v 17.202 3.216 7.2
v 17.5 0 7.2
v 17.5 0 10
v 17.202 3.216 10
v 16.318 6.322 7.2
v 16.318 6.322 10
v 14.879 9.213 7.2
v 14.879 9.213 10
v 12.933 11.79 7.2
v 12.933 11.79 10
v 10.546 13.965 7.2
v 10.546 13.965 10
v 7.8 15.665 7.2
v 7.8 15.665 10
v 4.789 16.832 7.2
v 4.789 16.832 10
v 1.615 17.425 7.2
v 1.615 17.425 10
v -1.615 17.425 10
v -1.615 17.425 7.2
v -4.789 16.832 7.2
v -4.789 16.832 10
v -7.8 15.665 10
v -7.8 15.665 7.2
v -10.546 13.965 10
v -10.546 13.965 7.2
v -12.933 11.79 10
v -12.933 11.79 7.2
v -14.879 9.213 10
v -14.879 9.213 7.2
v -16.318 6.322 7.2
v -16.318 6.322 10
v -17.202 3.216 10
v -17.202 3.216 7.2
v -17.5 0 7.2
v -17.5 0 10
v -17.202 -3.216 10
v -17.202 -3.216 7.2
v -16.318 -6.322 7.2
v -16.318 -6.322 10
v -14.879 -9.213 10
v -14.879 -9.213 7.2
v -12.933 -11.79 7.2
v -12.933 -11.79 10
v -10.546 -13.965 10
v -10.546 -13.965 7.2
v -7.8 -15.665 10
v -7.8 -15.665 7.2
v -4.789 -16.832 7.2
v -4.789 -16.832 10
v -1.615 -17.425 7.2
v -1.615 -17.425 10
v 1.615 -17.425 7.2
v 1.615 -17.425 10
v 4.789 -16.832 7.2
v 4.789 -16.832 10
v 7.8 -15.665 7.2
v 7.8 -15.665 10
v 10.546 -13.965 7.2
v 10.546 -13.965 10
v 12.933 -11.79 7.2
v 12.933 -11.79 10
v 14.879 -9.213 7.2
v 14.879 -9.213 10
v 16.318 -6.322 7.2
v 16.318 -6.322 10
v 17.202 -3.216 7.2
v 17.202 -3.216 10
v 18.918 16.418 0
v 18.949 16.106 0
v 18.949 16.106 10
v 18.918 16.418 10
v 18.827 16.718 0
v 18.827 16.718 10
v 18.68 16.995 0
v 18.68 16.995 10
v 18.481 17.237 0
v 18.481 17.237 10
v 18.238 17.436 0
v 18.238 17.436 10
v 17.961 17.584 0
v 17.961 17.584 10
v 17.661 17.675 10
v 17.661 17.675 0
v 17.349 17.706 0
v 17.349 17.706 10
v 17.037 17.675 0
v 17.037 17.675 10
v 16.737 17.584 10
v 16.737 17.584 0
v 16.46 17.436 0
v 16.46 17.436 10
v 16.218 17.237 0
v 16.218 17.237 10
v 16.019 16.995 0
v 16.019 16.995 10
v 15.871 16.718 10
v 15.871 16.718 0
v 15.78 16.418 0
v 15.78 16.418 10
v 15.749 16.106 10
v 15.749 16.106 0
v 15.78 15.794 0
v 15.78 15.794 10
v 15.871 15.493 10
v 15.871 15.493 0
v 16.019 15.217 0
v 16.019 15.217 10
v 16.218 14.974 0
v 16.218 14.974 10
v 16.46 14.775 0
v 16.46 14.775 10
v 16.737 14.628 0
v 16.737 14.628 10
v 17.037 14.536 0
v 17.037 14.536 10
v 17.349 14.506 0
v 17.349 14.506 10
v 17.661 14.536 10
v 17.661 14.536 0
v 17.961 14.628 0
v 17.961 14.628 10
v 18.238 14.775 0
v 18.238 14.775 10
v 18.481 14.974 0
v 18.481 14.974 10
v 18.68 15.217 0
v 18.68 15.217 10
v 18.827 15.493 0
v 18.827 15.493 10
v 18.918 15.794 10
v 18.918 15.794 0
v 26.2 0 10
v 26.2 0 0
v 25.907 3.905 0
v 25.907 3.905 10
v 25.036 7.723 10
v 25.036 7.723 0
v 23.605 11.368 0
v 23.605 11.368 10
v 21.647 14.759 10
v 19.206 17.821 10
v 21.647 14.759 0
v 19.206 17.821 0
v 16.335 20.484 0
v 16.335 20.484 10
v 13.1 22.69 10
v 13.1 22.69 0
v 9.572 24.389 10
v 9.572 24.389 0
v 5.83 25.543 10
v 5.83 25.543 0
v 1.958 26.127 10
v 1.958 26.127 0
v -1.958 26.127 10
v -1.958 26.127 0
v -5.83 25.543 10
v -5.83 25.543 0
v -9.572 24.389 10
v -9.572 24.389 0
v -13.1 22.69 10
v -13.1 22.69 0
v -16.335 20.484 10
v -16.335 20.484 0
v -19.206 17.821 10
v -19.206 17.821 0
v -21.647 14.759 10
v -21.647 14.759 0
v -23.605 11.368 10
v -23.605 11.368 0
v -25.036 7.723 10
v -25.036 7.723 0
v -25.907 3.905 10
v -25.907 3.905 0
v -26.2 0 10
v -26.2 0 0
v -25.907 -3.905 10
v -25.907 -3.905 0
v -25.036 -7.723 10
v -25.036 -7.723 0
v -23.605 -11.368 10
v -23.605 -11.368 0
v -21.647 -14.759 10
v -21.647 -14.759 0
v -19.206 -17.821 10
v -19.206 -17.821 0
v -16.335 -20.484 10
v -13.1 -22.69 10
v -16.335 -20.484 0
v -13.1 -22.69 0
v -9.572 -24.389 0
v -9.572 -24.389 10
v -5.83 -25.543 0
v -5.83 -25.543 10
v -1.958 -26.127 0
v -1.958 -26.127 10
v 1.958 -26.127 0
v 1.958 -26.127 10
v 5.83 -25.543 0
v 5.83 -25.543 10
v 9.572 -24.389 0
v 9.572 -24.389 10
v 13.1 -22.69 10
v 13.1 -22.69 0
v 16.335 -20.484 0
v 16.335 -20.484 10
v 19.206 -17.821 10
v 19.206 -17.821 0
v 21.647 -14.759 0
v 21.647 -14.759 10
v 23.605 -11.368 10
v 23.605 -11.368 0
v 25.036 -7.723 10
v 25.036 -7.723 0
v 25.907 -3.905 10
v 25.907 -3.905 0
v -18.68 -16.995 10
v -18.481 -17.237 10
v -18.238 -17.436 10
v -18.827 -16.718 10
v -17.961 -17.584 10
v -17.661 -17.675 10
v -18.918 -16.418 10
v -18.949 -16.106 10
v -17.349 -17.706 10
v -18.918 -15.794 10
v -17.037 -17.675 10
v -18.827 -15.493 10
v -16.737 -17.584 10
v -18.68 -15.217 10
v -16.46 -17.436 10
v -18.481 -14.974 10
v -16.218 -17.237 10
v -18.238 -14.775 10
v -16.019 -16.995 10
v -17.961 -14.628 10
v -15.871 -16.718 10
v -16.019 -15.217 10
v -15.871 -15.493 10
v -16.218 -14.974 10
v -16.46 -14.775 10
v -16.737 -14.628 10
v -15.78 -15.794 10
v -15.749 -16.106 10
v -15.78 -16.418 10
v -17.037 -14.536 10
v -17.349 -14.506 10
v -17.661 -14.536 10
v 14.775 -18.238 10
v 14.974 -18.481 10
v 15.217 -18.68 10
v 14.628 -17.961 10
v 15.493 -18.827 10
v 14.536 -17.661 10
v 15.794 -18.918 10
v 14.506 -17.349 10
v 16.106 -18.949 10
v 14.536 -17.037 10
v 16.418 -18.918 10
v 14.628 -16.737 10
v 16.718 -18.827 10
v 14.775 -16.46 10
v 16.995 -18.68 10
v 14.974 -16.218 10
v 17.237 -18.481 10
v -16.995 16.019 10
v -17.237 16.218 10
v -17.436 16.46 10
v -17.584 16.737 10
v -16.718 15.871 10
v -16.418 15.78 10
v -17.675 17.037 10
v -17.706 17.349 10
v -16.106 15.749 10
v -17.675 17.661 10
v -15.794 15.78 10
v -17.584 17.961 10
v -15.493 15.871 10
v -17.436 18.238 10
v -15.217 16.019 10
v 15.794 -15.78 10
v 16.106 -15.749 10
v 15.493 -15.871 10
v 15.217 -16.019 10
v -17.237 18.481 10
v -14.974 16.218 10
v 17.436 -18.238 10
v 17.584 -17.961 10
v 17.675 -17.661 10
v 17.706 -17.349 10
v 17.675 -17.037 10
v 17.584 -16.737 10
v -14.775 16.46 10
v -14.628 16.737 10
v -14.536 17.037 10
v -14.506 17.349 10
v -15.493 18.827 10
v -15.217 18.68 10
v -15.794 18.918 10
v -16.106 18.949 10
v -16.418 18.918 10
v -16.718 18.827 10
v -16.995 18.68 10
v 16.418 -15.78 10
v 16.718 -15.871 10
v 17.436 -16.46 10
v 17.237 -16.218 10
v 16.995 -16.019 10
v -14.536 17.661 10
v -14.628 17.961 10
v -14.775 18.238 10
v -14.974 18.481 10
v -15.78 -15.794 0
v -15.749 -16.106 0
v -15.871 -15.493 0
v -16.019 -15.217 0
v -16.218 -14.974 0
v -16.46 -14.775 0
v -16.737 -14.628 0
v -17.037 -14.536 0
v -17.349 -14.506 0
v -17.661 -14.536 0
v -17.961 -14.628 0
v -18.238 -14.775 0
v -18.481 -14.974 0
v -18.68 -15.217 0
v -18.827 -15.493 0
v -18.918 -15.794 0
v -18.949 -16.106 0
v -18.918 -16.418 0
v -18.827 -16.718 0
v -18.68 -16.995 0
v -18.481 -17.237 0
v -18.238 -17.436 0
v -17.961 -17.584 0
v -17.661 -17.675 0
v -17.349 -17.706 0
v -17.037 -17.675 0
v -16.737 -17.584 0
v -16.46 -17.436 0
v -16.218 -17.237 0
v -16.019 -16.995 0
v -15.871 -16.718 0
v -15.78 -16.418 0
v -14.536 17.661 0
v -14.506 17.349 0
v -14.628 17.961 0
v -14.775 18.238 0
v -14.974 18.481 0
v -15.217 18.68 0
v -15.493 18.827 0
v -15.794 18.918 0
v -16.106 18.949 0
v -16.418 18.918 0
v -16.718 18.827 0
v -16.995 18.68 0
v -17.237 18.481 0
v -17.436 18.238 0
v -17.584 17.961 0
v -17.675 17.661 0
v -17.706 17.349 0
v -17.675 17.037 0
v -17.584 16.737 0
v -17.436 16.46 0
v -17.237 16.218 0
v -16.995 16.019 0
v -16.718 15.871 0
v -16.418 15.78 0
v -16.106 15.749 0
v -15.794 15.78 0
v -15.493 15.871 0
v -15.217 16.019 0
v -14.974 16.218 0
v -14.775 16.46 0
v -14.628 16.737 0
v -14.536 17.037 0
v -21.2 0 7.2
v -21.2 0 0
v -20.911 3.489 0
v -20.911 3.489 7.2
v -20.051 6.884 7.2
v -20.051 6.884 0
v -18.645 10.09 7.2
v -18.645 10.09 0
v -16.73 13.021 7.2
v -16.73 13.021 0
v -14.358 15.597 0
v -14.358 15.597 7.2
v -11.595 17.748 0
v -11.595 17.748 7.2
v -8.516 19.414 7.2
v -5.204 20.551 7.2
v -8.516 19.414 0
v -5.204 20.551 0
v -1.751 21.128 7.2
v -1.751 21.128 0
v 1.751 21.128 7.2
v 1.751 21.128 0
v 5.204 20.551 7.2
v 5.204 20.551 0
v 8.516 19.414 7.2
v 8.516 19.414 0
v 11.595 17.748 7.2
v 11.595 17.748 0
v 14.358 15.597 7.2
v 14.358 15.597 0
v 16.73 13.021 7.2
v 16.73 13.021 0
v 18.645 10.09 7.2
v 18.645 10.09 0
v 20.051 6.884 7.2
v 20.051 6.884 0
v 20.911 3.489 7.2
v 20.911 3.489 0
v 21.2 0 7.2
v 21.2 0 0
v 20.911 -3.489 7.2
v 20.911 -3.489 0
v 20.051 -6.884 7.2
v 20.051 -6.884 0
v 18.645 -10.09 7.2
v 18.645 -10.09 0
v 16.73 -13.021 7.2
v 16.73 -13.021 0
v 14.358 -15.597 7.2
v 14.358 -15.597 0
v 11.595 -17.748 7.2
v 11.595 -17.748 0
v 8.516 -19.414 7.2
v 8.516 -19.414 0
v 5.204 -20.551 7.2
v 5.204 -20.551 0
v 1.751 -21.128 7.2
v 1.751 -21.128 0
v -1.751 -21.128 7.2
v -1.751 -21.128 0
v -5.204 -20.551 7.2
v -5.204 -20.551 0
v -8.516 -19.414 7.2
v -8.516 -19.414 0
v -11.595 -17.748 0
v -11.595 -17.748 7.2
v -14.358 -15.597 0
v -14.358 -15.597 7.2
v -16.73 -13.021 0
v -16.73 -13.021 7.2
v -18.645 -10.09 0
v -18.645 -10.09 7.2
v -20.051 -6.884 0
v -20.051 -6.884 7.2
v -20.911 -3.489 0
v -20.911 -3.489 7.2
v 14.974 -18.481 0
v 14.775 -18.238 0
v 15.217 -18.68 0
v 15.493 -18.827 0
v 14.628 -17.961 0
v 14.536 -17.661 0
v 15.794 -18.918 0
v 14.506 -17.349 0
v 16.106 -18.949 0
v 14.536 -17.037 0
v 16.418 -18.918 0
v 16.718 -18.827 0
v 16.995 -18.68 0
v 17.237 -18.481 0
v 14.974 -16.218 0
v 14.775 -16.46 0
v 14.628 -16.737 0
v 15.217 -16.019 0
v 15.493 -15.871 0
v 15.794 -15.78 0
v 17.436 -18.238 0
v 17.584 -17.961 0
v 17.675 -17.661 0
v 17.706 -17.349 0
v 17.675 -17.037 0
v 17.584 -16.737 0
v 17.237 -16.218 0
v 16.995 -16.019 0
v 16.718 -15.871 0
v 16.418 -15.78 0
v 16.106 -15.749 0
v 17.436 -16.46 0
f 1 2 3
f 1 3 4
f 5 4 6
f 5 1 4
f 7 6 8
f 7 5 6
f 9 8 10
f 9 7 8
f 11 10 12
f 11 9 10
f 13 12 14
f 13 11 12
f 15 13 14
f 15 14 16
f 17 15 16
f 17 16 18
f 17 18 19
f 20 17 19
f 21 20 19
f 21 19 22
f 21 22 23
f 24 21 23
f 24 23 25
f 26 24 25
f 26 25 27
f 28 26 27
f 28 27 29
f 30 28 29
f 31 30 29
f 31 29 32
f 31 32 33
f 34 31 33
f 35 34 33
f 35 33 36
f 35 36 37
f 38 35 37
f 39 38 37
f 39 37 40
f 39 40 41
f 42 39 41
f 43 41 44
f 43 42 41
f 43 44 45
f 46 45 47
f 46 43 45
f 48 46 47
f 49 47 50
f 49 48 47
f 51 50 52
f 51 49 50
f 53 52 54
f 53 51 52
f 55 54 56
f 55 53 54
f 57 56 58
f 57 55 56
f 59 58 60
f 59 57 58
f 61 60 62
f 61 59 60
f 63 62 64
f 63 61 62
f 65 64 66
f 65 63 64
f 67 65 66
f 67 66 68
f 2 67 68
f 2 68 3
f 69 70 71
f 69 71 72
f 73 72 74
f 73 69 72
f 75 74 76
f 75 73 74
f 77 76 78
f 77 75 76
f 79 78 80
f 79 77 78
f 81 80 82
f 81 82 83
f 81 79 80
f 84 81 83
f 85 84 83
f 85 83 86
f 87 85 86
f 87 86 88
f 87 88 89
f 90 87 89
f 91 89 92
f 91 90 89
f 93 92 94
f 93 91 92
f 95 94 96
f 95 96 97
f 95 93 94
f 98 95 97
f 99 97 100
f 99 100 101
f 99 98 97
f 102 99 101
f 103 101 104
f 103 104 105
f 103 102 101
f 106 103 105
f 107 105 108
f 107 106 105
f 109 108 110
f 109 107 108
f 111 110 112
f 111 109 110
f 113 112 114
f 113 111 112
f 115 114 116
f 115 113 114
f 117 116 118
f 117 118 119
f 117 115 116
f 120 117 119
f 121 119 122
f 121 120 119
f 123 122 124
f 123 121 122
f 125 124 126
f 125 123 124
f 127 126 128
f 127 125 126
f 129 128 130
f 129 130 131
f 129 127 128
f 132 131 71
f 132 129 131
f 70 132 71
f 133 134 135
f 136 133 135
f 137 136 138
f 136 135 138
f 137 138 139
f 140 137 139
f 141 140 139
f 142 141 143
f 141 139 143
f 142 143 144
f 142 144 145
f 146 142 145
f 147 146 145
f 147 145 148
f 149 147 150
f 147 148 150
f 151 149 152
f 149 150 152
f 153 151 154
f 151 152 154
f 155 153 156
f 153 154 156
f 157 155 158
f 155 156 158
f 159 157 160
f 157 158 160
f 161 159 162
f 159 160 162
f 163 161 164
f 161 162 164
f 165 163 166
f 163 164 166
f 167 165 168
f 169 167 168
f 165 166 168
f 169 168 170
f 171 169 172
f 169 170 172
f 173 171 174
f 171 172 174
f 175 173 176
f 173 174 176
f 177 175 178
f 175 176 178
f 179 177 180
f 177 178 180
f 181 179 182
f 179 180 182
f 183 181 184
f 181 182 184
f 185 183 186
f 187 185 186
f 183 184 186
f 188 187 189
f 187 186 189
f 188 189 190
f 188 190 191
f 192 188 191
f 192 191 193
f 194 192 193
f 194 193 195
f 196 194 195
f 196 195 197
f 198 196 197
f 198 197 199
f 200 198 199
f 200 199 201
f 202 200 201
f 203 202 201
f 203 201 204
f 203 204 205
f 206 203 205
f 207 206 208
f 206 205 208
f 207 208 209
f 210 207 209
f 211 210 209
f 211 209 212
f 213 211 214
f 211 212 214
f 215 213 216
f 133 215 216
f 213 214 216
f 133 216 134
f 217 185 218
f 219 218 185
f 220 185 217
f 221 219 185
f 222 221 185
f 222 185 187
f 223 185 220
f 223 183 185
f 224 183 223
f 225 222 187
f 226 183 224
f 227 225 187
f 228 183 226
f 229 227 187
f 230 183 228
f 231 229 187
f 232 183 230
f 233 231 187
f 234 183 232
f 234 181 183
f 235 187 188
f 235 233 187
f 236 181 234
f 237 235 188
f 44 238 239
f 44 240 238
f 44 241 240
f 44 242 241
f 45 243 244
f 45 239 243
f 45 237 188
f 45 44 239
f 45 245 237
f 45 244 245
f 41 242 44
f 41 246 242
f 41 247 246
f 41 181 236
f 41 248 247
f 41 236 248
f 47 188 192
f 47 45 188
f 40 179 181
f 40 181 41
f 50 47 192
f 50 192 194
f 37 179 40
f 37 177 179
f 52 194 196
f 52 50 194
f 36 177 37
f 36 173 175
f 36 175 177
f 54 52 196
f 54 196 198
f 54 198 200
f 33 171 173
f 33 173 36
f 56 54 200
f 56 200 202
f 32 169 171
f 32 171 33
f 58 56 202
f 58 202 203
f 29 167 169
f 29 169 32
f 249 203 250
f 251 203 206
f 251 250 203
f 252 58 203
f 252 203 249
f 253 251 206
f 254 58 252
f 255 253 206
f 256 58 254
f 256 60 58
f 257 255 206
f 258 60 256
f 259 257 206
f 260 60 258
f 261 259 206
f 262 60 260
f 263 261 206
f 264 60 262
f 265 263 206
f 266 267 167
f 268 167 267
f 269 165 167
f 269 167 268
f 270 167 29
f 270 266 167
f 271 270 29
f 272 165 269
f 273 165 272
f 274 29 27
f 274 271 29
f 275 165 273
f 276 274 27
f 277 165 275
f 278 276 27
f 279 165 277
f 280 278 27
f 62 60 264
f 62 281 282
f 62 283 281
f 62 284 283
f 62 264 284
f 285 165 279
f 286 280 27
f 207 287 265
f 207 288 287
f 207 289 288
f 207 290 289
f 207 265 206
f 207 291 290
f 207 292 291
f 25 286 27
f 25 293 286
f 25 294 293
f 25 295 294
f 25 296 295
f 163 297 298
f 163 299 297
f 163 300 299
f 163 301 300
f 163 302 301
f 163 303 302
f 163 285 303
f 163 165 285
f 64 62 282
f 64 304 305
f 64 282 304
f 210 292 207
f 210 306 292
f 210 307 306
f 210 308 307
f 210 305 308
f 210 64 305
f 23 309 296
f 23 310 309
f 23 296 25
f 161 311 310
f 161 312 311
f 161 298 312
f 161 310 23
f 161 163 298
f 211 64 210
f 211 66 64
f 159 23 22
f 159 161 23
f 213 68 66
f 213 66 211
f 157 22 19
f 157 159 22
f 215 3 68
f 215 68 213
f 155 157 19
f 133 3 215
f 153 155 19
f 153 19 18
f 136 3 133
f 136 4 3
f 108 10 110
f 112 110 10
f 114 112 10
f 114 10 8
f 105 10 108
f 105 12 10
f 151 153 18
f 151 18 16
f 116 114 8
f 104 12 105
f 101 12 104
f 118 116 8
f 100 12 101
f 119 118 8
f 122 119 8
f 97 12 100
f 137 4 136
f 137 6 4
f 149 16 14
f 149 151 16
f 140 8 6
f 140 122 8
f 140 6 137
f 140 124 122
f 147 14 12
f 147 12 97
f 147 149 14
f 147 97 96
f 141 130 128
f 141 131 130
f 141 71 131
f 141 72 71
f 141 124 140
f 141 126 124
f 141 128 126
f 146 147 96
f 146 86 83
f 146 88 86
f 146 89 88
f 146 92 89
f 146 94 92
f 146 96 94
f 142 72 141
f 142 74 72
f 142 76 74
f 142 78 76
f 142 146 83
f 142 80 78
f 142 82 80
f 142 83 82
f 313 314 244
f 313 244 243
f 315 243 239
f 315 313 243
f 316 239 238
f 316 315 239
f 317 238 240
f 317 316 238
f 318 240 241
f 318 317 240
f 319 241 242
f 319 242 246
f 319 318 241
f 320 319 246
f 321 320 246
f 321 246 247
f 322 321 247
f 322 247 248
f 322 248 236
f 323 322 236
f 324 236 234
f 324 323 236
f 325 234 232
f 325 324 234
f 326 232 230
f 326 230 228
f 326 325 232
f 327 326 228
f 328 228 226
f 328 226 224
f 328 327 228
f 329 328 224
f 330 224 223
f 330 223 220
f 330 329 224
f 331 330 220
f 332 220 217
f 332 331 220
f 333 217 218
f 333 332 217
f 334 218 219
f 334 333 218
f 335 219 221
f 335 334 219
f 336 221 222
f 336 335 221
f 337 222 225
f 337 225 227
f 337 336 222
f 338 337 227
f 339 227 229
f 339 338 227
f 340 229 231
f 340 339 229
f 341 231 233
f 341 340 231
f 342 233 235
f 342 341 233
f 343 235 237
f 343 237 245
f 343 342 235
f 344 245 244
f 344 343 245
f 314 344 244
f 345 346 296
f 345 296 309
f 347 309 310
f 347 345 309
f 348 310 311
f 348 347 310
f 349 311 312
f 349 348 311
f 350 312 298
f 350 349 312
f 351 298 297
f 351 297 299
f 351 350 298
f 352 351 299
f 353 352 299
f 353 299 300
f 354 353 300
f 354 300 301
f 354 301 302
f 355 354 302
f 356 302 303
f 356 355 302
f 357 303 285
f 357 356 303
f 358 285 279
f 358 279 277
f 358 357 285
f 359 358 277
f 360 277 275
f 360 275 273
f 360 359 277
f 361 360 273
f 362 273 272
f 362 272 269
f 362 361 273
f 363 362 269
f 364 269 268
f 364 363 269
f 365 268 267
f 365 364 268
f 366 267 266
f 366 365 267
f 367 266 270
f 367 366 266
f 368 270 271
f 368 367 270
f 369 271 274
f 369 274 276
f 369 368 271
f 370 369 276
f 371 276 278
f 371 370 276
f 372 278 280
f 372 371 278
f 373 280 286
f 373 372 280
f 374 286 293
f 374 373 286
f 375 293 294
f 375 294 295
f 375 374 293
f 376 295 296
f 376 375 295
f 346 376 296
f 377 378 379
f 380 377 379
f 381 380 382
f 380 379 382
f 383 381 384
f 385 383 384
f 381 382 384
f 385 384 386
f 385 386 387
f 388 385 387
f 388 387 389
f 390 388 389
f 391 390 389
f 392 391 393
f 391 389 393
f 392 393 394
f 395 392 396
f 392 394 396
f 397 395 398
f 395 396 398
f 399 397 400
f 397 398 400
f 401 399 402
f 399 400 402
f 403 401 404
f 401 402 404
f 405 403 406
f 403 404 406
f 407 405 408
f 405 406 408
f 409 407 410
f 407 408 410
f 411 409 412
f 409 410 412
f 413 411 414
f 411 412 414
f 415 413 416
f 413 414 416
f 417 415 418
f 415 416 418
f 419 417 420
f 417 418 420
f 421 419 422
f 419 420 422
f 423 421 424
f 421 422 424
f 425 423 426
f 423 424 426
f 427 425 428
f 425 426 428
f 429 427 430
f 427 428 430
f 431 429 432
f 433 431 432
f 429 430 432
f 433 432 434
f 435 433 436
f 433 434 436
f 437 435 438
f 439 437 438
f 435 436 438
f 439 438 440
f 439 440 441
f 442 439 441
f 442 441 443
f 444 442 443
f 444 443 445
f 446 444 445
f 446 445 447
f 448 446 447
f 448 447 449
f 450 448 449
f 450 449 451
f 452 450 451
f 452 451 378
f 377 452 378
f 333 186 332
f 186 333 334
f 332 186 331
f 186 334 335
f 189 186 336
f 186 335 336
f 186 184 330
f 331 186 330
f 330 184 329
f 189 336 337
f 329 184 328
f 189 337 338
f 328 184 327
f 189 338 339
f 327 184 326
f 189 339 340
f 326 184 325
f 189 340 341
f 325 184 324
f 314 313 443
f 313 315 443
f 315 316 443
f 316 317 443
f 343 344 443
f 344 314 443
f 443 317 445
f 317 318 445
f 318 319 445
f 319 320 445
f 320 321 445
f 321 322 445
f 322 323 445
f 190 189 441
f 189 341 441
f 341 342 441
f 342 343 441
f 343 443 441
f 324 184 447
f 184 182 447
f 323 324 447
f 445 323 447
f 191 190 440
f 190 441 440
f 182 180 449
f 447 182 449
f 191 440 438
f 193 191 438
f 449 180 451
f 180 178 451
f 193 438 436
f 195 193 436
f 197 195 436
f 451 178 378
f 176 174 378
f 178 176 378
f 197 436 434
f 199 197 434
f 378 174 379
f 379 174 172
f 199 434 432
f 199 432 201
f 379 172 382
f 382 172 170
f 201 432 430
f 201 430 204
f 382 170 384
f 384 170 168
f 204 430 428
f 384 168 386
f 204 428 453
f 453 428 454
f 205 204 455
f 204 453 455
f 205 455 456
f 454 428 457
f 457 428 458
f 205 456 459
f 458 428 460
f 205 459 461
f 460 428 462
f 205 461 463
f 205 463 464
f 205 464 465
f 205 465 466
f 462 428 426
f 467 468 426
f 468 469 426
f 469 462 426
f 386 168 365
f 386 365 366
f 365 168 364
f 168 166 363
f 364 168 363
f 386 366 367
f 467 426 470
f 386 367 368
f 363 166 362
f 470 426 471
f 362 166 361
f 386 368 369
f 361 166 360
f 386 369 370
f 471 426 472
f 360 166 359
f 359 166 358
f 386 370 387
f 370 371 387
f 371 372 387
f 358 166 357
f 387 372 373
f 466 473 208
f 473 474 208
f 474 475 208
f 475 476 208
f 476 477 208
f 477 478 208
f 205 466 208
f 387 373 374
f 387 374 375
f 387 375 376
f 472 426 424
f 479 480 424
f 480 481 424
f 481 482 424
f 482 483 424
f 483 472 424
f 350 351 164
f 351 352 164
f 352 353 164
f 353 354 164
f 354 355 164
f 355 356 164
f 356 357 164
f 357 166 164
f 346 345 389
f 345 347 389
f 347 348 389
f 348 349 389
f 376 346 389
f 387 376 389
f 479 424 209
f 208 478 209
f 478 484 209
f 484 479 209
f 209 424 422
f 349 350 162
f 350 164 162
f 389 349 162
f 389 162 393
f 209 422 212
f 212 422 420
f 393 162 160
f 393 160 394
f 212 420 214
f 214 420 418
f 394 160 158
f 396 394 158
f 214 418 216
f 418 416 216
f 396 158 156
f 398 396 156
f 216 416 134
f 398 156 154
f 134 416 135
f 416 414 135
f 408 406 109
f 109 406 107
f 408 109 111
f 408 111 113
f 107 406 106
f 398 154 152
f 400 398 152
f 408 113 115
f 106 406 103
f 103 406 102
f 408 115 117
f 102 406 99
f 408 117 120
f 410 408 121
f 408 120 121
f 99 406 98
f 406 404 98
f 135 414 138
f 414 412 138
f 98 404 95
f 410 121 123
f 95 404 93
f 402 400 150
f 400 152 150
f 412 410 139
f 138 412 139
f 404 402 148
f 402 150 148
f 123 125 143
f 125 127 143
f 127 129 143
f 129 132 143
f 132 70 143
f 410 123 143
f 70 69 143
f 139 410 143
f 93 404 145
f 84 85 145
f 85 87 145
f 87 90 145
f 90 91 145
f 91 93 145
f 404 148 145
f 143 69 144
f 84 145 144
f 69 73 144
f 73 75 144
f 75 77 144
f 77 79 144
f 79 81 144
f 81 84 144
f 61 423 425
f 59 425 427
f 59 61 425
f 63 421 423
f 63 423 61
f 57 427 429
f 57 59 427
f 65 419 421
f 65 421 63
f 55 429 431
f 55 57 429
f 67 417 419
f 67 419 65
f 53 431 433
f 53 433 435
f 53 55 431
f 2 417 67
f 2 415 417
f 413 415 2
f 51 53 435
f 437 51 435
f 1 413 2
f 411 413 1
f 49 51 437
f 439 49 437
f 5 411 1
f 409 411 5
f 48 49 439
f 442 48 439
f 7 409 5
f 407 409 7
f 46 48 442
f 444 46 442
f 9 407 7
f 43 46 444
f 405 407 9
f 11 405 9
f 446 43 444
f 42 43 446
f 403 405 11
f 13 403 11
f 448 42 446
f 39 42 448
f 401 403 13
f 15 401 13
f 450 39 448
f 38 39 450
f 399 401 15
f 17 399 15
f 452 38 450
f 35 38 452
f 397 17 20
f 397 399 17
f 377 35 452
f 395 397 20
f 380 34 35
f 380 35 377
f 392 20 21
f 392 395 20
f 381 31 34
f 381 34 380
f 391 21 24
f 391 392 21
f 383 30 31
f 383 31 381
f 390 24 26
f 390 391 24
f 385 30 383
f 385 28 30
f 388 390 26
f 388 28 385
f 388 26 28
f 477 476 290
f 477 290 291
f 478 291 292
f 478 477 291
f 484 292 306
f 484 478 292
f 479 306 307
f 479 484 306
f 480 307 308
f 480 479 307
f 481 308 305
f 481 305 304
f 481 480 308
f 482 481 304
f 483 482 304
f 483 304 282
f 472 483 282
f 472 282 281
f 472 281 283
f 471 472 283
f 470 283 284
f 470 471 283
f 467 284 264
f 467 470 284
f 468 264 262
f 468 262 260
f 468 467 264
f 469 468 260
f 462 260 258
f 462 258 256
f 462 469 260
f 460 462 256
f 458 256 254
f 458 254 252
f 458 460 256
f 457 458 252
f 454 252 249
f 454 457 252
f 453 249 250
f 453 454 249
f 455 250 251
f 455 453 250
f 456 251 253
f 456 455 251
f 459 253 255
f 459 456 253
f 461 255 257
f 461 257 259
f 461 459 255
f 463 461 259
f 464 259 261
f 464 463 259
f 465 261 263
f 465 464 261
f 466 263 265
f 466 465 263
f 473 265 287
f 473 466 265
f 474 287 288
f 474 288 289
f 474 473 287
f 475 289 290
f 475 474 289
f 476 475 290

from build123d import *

# Parameters (mm, degrees)
SKETCH1_R           = 26.2
SKETCH1_R_2         = 1.6
SKETCH1_R_3         = 17.5
BOSS_EXTRUDE1_DEPTH = 10
SKETCH2_R           = 21.2
CUT_EXTRUDE1_DEPTH  = 7.2


with BuildPart() as part:
    # Sketch1 → Boss-Extrude1 (new body)
    with BuildSketch(Plane.XY):
        Circle(SKETCH1_R)
        with Locations((17.349171734, 16.10572211)):
            Circle(SKETCH1_R_2, mode=Mode.SUBTRACT)
        with Locations((16.10572211, -17.349171734)):
            Circle(SKETCH1_R_2, mode=Mode.SUBTRACT)
        with Locations((-16.10572211, 17.349171734)):
            Circle(SKETCH1_R_2, mode=Mode.SUBTRACT)
        with Locations((-17.349171734, -16.10572211)):
            Circle(SKETCH1_R_2, mode=Mode.SUBTRACT)
        Circle(SKETCH1_R_3, mode=Mode.SUBTRACT)
    extrude(amount=BOSS_EXTRUDE1_DEPTH)

    # Sketch2 → Cut-Extrude1 (cut)
    with BuildSketch(Plane(origin=(0, 0, 0), x_dir=(-1, 0, 0), z_dir=(0, 0, -1))):
        Circle(SKETCH2_R)
    extrude(amount=-CUT_EXTRUDE1_DEPTH, mode=Mode.SUBTRACT)


solid = part.part
